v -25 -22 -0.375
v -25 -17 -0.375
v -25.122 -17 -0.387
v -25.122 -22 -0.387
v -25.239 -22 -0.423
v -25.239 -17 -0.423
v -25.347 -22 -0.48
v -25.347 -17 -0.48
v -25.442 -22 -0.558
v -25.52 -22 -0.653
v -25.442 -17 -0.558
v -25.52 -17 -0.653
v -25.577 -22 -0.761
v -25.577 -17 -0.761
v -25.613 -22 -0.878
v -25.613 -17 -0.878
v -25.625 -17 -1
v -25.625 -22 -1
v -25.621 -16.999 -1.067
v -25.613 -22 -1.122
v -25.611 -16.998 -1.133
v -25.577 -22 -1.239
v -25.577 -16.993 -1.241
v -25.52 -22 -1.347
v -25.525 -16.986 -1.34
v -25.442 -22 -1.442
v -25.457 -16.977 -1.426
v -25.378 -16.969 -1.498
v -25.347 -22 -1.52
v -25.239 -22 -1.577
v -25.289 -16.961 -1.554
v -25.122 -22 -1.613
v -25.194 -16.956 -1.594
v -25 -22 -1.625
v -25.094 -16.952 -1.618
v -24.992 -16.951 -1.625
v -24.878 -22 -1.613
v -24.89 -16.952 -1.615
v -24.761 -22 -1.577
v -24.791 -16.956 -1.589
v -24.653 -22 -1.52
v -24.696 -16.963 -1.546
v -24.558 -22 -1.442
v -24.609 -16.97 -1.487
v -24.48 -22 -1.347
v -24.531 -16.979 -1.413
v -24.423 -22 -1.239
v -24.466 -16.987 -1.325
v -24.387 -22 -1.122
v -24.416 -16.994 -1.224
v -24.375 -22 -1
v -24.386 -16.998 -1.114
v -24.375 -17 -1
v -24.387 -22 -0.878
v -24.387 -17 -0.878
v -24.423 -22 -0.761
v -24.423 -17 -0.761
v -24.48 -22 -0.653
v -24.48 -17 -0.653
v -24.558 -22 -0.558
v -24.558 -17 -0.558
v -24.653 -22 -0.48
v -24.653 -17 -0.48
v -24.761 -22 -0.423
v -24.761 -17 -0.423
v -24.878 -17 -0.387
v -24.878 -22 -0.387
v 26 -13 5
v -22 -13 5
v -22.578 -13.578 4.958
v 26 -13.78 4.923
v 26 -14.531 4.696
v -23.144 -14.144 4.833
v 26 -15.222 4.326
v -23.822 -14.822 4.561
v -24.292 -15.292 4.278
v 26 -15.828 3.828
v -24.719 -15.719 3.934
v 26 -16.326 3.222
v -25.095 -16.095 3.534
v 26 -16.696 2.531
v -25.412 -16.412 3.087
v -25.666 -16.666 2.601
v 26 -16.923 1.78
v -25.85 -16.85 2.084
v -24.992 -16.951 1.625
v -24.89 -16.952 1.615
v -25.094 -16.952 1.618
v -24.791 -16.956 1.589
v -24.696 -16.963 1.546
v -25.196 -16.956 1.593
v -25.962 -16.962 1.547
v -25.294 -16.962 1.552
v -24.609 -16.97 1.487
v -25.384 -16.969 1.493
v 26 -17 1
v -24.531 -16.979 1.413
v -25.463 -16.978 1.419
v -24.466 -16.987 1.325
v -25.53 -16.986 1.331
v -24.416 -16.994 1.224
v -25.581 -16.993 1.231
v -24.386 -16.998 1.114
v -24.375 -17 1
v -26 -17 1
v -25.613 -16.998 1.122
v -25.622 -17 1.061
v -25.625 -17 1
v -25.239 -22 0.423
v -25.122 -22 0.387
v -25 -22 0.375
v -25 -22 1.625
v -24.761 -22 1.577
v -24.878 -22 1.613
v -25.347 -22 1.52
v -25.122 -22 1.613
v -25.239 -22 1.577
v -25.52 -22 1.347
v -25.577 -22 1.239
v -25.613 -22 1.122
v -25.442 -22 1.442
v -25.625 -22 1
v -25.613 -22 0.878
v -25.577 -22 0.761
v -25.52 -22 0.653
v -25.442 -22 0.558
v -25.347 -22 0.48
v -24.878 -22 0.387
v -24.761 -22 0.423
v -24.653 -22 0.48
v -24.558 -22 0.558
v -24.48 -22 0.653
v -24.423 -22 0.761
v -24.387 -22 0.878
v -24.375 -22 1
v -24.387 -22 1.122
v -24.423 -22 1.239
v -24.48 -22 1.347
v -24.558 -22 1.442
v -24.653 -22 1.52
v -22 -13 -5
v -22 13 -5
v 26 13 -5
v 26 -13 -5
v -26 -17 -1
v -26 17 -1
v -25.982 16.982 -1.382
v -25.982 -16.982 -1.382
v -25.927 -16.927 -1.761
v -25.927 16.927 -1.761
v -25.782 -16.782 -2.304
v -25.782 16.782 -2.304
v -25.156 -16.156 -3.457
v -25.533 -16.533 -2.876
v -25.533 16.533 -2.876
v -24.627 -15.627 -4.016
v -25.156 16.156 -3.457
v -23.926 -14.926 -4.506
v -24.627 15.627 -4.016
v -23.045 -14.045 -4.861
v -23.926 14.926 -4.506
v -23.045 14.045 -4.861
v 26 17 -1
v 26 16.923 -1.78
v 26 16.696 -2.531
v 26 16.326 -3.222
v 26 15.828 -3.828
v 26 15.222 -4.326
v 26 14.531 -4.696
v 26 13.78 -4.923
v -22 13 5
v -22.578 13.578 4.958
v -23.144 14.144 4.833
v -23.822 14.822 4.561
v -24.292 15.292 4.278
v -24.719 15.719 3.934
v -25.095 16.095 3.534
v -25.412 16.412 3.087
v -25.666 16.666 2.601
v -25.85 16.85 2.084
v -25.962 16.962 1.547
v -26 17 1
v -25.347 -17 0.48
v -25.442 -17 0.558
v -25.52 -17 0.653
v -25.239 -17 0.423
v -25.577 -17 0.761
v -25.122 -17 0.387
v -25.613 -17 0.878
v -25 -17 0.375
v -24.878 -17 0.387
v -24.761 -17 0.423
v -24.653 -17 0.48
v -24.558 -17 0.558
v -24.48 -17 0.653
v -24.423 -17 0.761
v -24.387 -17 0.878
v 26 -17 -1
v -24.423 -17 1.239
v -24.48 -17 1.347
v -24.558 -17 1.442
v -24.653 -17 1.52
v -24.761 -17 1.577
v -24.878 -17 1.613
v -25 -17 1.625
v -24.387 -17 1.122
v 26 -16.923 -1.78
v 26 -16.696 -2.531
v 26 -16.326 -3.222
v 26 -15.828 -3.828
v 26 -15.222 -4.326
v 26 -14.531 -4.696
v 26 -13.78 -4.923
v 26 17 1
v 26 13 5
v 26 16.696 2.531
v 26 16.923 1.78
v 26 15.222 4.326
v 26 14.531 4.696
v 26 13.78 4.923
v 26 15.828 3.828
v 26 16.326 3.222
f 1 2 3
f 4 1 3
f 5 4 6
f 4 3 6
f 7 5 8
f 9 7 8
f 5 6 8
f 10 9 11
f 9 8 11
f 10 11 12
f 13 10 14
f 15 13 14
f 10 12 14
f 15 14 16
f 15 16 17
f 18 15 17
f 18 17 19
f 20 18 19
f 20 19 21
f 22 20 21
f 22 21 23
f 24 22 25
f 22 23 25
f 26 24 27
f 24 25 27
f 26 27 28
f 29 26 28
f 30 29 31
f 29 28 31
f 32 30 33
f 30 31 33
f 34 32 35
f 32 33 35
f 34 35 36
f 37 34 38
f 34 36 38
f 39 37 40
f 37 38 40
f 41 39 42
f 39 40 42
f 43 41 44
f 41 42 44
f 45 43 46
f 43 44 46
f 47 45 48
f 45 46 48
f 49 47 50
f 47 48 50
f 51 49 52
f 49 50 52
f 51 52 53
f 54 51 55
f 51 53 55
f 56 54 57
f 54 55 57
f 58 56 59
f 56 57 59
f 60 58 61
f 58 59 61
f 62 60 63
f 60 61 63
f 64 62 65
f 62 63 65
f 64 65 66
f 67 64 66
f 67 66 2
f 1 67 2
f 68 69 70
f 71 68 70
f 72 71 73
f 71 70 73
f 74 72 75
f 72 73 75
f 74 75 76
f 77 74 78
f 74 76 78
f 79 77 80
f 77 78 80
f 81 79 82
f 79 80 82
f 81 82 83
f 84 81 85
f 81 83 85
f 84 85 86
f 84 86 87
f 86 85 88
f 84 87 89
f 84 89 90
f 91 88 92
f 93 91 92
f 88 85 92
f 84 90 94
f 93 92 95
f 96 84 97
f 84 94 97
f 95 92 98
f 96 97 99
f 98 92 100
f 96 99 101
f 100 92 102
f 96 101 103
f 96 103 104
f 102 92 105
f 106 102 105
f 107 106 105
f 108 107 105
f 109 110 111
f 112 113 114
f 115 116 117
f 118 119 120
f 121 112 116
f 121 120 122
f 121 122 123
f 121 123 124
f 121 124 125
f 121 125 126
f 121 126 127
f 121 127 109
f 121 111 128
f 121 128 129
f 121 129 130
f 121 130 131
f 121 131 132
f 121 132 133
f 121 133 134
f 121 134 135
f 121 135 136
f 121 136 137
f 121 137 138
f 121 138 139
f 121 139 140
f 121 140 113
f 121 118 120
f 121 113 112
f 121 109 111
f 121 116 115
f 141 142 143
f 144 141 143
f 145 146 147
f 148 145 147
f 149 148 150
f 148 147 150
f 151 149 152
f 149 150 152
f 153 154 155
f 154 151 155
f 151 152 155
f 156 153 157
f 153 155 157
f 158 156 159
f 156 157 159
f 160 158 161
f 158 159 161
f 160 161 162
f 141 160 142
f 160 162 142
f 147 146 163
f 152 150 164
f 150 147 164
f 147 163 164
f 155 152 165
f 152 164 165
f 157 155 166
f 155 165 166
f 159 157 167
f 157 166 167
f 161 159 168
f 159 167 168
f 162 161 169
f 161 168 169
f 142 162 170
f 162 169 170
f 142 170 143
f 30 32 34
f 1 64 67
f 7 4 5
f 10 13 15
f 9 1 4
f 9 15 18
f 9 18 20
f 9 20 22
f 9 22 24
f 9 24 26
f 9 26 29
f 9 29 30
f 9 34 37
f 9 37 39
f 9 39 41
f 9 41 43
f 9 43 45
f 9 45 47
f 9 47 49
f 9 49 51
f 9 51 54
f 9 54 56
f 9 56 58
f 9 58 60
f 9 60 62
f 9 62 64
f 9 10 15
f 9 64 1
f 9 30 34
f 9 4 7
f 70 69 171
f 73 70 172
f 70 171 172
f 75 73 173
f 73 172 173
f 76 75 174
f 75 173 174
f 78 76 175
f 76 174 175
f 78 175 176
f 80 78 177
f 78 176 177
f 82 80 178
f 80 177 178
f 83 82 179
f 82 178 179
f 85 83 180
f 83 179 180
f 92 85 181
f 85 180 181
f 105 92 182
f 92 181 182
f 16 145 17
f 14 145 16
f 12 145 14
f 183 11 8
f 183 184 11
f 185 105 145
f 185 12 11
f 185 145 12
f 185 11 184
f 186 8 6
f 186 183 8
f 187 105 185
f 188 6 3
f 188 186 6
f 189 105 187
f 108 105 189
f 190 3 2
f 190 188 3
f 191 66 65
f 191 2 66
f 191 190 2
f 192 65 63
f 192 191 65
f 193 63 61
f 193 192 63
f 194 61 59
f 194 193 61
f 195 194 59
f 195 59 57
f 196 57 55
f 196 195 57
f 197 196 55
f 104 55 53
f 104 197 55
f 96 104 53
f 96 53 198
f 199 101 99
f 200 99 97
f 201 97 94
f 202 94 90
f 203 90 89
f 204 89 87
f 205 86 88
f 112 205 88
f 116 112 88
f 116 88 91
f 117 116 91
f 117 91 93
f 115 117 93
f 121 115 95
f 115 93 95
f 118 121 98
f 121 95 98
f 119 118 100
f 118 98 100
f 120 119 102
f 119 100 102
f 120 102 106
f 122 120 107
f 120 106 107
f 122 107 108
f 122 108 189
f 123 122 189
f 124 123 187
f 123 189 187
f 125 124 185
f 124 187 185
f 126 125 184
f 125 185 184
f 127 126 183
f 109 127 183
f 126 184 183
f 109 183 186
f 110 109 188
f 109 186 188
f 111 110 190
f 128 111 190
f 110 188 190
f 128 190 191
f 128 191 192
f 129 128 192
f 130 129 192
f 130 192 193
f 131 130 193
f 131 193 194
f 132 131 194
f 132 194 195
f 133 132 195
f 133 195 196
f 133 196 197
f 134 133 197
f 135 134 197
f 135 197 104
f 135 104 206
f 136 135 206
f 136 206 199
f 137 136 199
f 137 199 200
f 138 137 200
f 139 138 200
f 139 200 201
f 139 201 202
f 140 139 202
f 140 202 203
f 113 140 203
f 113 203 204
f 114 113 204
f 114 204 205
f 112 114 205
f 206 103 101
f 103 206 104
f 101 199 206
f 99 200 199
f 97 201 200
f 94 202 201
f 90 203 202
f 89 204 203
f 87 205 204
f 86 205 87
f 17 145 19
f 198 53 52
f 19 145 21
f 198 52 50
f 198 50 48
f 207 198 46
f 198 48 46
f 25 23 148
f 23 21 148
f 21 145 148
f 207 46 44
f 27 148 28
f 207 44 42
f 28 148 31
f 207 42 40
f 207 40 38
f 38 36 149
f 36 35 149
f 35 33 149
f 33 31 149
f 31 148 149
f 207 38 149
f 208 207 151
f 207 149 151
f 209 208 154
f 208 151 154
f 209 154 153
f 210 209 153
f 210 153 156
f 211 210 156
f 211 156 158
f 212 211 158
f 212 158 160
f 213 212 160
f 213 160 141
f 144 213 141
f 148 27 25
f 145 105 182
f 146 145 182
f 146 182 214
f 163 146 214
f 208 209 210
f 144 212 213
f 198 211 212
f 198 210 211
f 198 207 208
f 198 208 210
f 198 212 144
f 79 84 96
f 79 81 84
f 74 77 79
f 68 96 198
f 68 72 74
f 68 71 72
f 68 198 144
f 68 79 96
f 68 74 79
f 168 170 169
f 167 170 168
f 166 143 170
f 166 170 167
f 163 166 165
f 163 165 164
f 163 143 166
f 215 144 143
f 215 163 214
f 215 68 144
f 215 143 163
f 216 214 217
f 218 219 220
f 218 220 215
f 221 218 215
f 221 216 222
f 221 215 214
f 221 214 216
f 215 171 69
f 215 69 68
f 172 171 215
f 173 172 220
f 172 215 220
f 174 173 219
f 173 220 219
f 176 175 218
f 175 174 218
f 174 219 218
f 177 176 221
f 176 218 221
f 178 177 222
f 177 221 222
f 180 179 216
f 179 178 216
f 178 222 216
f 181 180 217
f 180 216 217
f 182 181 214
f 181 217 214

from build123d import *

# Parameters (mm, degrees)
SKETCH1_W           = 52
SKETCH1_H           = 34
BOSS_EXTRUDE1_DEPTH = 5
SKETCH2_R           = 0.625
BOSS_EXTRUDE2_DEPTH = 5
FILLET1_R           = 4


with BuildPart() as part:
    # Sketch1 → Boss-Extrude1 (new, symmetric)
    with BuildSketch(Plane.XY):
        Rectangle(SKETCH1_W, SKETCH1_H)
    extrude(amount=BOSS_EXTRUDE1_DEPTH, both=True)

    # Sketch2 → Boss-Extrude2 (add)
    with BuildSketch(Plane.XZ.offset(17)):
        with Locations(Location((-25, 1, 0), (0, 0, 90))):
            Circle(SKETCH2_R)
        with Locations(Location((-25, -1, 0), (0, 0, 90))):
            Circle(SKETCH2_R)
    extrude(amount=BOSS_EXTRUDE2_DEPTH)

    # Fillet1
    # the kernel refuses this fillet: 4 mm, written as the material it takes off along each edge
    with BuildSketch(Plane(origin=(-26, 27, 5), x_dir=(0, 0, -1), z_dir=(0, -1, 0)), Plane(origin=(-26, 27, -5), x_dir=(1, 0, 0), z_dir=(0, -1, 0))) as fillet1_piece_1:
        with BuildLine():
            CenterArc((FILLET1_R, FILLET1_R), FILLET1_R, 180, 90)
            Line((0, FILLET1_R), (0, 0))
            Line((0, 0), (FILLET1_R, 0))
        make_face()
    extrude(amount=54, mode=Mode.SUBTRACT)
    with BuildSketch(Plane(origin=(-36, -17, 5), x_dir=(0, 0, -1), z_dir=(1, 0, 0))) as fillet1_piece_2_section:
        with BuildLine():
            CenterArc((FILLET1_R, FILLET1_R), FILLET1_R, 180, 90)
            Line((0, FILLET1_R), (0, 0))
            Line((0, 0), (FILLET1_R, 0))
        make_face()
    fillet1_piece_2 = extrude(amount=72, mode=Mode.PRIVATE)
    fillet1_piece_2 = fillet1_piece_2 - Plane(origin=(-25, -16.094238655, 1), x_dir=(0, 0, 1), z_dir=(0, 1, 0)) * Cylinder(0.625, 160, mode=Mode.PRIVATE)
    add(fillet1_piece_2, mode=Mode.SUBTRACT)
    with BuildSketch(Plane(origin=(-36, -17, -5), x_dir=(0, 0, 1), z_dir=(1, 0, 0))) as fillet1_piece_3_section:
        with BuildLine():
            CenterArc((FILLET1_R, -FILLET1_R), FILLET1_R, 90, 90)
            Line((0, -FILLET1_R), (0, 0))
            Line((0, 0), (FILLET1_R, 0))
        make_face()
    fillet1_piece_3 = extrude(amount=72, mode=Mode.PRIVATE)
    fillet1_piece_3 = fillet1_piece_3 - Plane(origin=(-25, -16.094238658, -1), x_dir=(0, 0, 1), z_dir=(0, 1, 0)) * Cylinder(0.625, 160, mode=Mode.PRIVATE)
    add(fillet1_piece_3, mode=Mode.SUBTRACT)
    with BuildSketch(Plane(origin=(36, 17, -5), x_dir=(0, -1, 0), z_dir=(-1, 0, 0))) as fillet1_piece_4:
        with BuildLine():
            CenterArc((FILLET1_R, FILLET1_R), FILLET1_R, 180, 90)
            Line((0, FILLET1_R), (0, 0))
            Line((0, 0), (FILLET1_R, 0))
        make_face()
    extrude(amount=72, mode=Mode.SUBTRACT)
    with BuildSketch(Plane(origin=(36, 17, 5), x_dir=(0, -1, 0), z_dir=(-1, 0, 0))) as fillet1_piece_5:
        with BuildLine():
            CenterArc((FILLET1_R, -FILLET1_R), FILLET1_R, 90, 90)
            Line((0, -FILLET1_R), (0, 0))
            Line((0, 0), (FILLET1_R, 0))
        make_face()
    extrude(amount=72, mode=Mode.SUBTRACT)


solid = part.part
